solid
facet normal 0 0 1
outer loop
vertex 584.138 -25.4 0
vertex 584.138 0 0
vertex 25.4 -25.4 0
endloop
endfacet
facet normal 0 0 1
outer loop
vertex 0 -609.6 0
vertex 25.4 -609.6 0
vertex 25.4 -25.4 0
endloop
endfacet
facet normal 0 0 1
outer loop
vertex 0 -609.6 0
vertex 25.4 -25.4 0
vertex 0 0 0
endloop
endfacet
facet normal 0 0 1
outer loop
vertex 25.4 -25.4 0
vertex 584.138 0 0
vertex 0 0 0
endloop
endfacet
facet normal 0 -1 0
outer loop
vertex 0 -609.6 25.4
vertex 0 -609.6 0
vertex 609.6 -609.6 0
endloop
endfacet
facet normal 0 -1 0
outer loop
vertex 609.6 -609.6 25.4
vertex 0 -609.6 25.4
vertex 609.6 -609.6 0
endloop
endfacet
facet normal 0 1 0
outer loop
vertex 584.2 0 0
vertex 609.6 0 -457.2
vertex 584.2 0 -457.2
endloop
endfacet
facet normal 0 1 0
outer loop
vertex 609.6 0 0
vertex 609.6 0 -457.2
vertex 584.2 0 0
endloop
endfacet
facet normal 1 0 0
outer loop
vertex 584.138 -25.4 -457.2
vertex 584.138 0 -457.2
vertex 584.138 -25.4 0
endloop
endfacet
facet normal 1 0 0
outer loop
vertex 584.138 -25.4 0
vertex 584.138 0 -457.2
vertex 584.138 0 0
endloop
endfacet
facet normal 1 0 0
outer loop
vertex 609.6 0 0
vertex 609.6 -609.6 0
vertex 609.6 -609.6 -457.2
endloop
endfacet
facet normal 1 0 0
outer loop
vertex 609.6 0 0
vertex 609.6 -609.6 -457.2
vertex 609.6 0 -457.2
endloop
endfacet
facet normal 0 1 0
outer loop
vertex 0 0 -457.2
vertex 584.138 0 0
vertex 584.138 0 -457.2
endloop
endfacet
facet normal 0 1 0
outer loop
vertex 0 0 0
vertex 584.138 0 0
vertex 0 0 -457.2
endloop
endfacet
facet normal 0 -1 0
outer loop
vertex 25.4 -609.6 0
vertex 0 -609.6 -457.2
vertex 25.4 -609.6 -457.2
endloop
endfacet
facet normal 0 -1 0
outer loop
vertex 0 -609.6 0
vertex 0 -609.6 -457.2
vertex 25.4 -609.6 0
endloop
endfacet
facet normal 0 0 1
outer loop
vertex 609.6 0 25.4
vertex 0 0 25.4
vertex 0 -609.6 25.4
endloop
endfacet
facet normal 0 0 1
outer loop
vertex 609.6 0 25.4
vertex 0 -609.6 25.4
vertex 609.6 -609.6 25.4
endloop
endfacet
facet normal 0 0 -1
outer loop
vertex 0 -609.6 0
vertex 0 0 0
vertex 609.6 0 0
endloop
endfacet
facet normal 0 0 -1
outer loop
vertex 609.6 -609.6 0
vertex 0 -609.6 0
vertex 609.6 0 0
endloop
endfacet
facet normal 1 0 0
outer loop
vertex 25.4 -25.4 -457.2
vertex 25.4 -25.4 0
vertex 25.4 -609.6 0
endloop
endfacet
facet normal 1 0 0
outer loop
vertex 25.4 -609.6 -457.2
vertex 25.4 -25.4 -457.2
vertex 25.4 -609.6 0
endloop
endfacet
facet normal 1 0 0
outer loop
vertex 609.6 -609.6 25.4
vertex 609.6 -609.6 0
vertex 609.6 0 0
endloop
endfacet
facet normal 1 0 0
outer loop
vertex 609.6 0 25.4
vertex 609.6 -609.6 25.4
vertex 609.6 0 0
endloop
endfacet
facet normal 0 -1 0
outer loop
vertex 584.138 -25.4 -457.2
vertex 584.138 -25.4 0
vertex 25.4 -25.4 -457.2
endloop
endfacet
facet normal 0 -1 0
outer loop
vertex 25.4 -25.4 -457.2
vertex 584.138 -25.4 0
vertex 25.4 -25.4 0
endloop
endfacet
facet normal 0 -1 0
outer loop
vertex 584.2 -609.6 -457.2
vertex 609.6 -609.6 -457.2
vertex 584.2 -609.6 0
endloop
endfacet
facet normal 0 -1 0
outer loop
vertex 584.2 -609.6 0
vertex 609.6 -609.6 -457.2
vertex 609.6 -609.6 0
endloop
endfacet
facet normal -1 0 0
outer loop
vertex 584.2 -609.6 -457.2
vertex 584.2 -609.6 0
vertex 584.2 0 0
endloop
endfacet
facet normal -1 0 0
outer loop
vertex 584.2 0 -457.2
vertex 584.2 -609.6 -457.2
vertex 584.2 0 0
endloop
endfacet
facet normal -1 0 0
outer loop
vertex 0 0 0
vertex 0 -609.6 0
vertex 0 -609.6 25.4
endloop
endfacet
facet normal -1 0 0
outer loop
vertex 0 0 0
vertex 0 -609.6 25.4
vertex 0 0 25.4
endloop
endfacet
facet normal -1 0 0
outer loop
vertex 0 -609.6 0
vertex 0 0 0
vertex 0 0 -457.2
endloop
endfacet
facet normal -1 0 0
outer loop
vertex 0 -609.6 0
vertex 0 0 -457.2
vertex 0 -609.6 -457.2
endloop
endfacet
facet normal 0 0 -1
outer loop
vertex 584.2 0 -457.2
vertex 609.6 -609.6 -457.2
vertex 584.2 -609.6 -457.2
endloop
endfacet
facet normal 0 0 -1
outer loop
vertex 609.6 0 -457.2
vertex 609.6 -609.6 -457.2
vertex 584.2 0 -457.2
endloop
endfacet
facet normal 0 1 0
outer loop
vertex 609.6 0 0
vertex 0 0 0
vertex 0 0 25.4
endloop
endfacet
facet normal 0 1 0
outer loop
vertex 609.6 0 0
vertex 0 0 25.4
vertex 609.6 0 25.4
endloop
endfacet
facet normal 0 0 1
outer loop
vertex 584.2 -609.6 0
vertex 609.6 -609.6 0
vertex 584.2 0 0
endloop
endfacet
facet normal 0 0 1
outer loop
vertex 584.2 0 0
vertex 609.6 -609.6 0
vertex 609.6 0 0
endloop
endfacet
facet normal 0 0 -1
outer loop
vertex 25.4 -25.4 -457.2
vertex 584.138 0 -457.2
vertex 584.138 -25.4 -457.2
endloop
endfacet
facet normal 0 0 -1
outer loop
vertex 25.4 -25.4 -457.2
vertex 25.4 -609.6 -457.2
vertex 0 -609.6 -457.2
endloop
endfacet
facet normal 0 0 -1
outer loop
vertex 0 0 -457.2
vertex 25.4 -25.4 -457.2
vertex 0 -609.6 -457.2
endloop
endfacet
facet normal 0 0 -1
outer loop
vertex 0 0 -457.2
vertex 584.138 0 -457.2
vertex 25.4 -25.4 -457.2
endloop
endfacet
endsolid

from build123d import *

# Parameters (mm, degrees)
F0_W     = 609.6
F0_H     = 609.6
F1_DEPTH = 25.4
F2_W     = 609.6
F2_H     = 457.2
F3_DEPTH = 25.4
F4_W     = 609.6
F4_H     = 457.2
F5_DEPTH = 25.4
F6_W     = 558.8
F6_H     = 457.2
F7_DEPTH = 25.4


with BuildPart() as f1:
    # F0 (on Top) → F1 (new body)
    with BuildSketch(Plane.XY):
        with Locations((304.8, -304.8)):
            Rectangle(F0_W, F0_H)
    extrude(amount=F1_DEPTH)


with BuildPart() as f3:
    # F2 (on face) → F3 (new body)
    with BuildSketch(Plane.YZ.offset(609.6)):
        with Locations((-304.8, -228.6)):
            Rectangle(F2_W, F2_H)
    extrude(amount=-F3_DEPTH)


with BuildPart() as f5:
    # F4 (on face) → F5 (new body)
    with BuildSketch(Plane(origin=(0, 0, 0), x_dir=(0, -1, 0), z_dir=(-1, 0, 0))):
        with Locations((304.8, -228.6)):
            Rectangle(F4_W, F4_H)
    extrude(amount=-F5_DEPTH)

    # F6 (on face) → F7 (join)
    with BuildSketch(Plane(origin=(0, 0, 0), x_dir=(-1, 0, 0), z_dir=(0, 1, 0))):
        with Locations((-304.7380357742, -228.6)):
            Rectangle(F6_W, F6_H)
    extrude(amount=-F7_DEPTH)


solid = Compound([f1.part, f3.part, f5.part])
